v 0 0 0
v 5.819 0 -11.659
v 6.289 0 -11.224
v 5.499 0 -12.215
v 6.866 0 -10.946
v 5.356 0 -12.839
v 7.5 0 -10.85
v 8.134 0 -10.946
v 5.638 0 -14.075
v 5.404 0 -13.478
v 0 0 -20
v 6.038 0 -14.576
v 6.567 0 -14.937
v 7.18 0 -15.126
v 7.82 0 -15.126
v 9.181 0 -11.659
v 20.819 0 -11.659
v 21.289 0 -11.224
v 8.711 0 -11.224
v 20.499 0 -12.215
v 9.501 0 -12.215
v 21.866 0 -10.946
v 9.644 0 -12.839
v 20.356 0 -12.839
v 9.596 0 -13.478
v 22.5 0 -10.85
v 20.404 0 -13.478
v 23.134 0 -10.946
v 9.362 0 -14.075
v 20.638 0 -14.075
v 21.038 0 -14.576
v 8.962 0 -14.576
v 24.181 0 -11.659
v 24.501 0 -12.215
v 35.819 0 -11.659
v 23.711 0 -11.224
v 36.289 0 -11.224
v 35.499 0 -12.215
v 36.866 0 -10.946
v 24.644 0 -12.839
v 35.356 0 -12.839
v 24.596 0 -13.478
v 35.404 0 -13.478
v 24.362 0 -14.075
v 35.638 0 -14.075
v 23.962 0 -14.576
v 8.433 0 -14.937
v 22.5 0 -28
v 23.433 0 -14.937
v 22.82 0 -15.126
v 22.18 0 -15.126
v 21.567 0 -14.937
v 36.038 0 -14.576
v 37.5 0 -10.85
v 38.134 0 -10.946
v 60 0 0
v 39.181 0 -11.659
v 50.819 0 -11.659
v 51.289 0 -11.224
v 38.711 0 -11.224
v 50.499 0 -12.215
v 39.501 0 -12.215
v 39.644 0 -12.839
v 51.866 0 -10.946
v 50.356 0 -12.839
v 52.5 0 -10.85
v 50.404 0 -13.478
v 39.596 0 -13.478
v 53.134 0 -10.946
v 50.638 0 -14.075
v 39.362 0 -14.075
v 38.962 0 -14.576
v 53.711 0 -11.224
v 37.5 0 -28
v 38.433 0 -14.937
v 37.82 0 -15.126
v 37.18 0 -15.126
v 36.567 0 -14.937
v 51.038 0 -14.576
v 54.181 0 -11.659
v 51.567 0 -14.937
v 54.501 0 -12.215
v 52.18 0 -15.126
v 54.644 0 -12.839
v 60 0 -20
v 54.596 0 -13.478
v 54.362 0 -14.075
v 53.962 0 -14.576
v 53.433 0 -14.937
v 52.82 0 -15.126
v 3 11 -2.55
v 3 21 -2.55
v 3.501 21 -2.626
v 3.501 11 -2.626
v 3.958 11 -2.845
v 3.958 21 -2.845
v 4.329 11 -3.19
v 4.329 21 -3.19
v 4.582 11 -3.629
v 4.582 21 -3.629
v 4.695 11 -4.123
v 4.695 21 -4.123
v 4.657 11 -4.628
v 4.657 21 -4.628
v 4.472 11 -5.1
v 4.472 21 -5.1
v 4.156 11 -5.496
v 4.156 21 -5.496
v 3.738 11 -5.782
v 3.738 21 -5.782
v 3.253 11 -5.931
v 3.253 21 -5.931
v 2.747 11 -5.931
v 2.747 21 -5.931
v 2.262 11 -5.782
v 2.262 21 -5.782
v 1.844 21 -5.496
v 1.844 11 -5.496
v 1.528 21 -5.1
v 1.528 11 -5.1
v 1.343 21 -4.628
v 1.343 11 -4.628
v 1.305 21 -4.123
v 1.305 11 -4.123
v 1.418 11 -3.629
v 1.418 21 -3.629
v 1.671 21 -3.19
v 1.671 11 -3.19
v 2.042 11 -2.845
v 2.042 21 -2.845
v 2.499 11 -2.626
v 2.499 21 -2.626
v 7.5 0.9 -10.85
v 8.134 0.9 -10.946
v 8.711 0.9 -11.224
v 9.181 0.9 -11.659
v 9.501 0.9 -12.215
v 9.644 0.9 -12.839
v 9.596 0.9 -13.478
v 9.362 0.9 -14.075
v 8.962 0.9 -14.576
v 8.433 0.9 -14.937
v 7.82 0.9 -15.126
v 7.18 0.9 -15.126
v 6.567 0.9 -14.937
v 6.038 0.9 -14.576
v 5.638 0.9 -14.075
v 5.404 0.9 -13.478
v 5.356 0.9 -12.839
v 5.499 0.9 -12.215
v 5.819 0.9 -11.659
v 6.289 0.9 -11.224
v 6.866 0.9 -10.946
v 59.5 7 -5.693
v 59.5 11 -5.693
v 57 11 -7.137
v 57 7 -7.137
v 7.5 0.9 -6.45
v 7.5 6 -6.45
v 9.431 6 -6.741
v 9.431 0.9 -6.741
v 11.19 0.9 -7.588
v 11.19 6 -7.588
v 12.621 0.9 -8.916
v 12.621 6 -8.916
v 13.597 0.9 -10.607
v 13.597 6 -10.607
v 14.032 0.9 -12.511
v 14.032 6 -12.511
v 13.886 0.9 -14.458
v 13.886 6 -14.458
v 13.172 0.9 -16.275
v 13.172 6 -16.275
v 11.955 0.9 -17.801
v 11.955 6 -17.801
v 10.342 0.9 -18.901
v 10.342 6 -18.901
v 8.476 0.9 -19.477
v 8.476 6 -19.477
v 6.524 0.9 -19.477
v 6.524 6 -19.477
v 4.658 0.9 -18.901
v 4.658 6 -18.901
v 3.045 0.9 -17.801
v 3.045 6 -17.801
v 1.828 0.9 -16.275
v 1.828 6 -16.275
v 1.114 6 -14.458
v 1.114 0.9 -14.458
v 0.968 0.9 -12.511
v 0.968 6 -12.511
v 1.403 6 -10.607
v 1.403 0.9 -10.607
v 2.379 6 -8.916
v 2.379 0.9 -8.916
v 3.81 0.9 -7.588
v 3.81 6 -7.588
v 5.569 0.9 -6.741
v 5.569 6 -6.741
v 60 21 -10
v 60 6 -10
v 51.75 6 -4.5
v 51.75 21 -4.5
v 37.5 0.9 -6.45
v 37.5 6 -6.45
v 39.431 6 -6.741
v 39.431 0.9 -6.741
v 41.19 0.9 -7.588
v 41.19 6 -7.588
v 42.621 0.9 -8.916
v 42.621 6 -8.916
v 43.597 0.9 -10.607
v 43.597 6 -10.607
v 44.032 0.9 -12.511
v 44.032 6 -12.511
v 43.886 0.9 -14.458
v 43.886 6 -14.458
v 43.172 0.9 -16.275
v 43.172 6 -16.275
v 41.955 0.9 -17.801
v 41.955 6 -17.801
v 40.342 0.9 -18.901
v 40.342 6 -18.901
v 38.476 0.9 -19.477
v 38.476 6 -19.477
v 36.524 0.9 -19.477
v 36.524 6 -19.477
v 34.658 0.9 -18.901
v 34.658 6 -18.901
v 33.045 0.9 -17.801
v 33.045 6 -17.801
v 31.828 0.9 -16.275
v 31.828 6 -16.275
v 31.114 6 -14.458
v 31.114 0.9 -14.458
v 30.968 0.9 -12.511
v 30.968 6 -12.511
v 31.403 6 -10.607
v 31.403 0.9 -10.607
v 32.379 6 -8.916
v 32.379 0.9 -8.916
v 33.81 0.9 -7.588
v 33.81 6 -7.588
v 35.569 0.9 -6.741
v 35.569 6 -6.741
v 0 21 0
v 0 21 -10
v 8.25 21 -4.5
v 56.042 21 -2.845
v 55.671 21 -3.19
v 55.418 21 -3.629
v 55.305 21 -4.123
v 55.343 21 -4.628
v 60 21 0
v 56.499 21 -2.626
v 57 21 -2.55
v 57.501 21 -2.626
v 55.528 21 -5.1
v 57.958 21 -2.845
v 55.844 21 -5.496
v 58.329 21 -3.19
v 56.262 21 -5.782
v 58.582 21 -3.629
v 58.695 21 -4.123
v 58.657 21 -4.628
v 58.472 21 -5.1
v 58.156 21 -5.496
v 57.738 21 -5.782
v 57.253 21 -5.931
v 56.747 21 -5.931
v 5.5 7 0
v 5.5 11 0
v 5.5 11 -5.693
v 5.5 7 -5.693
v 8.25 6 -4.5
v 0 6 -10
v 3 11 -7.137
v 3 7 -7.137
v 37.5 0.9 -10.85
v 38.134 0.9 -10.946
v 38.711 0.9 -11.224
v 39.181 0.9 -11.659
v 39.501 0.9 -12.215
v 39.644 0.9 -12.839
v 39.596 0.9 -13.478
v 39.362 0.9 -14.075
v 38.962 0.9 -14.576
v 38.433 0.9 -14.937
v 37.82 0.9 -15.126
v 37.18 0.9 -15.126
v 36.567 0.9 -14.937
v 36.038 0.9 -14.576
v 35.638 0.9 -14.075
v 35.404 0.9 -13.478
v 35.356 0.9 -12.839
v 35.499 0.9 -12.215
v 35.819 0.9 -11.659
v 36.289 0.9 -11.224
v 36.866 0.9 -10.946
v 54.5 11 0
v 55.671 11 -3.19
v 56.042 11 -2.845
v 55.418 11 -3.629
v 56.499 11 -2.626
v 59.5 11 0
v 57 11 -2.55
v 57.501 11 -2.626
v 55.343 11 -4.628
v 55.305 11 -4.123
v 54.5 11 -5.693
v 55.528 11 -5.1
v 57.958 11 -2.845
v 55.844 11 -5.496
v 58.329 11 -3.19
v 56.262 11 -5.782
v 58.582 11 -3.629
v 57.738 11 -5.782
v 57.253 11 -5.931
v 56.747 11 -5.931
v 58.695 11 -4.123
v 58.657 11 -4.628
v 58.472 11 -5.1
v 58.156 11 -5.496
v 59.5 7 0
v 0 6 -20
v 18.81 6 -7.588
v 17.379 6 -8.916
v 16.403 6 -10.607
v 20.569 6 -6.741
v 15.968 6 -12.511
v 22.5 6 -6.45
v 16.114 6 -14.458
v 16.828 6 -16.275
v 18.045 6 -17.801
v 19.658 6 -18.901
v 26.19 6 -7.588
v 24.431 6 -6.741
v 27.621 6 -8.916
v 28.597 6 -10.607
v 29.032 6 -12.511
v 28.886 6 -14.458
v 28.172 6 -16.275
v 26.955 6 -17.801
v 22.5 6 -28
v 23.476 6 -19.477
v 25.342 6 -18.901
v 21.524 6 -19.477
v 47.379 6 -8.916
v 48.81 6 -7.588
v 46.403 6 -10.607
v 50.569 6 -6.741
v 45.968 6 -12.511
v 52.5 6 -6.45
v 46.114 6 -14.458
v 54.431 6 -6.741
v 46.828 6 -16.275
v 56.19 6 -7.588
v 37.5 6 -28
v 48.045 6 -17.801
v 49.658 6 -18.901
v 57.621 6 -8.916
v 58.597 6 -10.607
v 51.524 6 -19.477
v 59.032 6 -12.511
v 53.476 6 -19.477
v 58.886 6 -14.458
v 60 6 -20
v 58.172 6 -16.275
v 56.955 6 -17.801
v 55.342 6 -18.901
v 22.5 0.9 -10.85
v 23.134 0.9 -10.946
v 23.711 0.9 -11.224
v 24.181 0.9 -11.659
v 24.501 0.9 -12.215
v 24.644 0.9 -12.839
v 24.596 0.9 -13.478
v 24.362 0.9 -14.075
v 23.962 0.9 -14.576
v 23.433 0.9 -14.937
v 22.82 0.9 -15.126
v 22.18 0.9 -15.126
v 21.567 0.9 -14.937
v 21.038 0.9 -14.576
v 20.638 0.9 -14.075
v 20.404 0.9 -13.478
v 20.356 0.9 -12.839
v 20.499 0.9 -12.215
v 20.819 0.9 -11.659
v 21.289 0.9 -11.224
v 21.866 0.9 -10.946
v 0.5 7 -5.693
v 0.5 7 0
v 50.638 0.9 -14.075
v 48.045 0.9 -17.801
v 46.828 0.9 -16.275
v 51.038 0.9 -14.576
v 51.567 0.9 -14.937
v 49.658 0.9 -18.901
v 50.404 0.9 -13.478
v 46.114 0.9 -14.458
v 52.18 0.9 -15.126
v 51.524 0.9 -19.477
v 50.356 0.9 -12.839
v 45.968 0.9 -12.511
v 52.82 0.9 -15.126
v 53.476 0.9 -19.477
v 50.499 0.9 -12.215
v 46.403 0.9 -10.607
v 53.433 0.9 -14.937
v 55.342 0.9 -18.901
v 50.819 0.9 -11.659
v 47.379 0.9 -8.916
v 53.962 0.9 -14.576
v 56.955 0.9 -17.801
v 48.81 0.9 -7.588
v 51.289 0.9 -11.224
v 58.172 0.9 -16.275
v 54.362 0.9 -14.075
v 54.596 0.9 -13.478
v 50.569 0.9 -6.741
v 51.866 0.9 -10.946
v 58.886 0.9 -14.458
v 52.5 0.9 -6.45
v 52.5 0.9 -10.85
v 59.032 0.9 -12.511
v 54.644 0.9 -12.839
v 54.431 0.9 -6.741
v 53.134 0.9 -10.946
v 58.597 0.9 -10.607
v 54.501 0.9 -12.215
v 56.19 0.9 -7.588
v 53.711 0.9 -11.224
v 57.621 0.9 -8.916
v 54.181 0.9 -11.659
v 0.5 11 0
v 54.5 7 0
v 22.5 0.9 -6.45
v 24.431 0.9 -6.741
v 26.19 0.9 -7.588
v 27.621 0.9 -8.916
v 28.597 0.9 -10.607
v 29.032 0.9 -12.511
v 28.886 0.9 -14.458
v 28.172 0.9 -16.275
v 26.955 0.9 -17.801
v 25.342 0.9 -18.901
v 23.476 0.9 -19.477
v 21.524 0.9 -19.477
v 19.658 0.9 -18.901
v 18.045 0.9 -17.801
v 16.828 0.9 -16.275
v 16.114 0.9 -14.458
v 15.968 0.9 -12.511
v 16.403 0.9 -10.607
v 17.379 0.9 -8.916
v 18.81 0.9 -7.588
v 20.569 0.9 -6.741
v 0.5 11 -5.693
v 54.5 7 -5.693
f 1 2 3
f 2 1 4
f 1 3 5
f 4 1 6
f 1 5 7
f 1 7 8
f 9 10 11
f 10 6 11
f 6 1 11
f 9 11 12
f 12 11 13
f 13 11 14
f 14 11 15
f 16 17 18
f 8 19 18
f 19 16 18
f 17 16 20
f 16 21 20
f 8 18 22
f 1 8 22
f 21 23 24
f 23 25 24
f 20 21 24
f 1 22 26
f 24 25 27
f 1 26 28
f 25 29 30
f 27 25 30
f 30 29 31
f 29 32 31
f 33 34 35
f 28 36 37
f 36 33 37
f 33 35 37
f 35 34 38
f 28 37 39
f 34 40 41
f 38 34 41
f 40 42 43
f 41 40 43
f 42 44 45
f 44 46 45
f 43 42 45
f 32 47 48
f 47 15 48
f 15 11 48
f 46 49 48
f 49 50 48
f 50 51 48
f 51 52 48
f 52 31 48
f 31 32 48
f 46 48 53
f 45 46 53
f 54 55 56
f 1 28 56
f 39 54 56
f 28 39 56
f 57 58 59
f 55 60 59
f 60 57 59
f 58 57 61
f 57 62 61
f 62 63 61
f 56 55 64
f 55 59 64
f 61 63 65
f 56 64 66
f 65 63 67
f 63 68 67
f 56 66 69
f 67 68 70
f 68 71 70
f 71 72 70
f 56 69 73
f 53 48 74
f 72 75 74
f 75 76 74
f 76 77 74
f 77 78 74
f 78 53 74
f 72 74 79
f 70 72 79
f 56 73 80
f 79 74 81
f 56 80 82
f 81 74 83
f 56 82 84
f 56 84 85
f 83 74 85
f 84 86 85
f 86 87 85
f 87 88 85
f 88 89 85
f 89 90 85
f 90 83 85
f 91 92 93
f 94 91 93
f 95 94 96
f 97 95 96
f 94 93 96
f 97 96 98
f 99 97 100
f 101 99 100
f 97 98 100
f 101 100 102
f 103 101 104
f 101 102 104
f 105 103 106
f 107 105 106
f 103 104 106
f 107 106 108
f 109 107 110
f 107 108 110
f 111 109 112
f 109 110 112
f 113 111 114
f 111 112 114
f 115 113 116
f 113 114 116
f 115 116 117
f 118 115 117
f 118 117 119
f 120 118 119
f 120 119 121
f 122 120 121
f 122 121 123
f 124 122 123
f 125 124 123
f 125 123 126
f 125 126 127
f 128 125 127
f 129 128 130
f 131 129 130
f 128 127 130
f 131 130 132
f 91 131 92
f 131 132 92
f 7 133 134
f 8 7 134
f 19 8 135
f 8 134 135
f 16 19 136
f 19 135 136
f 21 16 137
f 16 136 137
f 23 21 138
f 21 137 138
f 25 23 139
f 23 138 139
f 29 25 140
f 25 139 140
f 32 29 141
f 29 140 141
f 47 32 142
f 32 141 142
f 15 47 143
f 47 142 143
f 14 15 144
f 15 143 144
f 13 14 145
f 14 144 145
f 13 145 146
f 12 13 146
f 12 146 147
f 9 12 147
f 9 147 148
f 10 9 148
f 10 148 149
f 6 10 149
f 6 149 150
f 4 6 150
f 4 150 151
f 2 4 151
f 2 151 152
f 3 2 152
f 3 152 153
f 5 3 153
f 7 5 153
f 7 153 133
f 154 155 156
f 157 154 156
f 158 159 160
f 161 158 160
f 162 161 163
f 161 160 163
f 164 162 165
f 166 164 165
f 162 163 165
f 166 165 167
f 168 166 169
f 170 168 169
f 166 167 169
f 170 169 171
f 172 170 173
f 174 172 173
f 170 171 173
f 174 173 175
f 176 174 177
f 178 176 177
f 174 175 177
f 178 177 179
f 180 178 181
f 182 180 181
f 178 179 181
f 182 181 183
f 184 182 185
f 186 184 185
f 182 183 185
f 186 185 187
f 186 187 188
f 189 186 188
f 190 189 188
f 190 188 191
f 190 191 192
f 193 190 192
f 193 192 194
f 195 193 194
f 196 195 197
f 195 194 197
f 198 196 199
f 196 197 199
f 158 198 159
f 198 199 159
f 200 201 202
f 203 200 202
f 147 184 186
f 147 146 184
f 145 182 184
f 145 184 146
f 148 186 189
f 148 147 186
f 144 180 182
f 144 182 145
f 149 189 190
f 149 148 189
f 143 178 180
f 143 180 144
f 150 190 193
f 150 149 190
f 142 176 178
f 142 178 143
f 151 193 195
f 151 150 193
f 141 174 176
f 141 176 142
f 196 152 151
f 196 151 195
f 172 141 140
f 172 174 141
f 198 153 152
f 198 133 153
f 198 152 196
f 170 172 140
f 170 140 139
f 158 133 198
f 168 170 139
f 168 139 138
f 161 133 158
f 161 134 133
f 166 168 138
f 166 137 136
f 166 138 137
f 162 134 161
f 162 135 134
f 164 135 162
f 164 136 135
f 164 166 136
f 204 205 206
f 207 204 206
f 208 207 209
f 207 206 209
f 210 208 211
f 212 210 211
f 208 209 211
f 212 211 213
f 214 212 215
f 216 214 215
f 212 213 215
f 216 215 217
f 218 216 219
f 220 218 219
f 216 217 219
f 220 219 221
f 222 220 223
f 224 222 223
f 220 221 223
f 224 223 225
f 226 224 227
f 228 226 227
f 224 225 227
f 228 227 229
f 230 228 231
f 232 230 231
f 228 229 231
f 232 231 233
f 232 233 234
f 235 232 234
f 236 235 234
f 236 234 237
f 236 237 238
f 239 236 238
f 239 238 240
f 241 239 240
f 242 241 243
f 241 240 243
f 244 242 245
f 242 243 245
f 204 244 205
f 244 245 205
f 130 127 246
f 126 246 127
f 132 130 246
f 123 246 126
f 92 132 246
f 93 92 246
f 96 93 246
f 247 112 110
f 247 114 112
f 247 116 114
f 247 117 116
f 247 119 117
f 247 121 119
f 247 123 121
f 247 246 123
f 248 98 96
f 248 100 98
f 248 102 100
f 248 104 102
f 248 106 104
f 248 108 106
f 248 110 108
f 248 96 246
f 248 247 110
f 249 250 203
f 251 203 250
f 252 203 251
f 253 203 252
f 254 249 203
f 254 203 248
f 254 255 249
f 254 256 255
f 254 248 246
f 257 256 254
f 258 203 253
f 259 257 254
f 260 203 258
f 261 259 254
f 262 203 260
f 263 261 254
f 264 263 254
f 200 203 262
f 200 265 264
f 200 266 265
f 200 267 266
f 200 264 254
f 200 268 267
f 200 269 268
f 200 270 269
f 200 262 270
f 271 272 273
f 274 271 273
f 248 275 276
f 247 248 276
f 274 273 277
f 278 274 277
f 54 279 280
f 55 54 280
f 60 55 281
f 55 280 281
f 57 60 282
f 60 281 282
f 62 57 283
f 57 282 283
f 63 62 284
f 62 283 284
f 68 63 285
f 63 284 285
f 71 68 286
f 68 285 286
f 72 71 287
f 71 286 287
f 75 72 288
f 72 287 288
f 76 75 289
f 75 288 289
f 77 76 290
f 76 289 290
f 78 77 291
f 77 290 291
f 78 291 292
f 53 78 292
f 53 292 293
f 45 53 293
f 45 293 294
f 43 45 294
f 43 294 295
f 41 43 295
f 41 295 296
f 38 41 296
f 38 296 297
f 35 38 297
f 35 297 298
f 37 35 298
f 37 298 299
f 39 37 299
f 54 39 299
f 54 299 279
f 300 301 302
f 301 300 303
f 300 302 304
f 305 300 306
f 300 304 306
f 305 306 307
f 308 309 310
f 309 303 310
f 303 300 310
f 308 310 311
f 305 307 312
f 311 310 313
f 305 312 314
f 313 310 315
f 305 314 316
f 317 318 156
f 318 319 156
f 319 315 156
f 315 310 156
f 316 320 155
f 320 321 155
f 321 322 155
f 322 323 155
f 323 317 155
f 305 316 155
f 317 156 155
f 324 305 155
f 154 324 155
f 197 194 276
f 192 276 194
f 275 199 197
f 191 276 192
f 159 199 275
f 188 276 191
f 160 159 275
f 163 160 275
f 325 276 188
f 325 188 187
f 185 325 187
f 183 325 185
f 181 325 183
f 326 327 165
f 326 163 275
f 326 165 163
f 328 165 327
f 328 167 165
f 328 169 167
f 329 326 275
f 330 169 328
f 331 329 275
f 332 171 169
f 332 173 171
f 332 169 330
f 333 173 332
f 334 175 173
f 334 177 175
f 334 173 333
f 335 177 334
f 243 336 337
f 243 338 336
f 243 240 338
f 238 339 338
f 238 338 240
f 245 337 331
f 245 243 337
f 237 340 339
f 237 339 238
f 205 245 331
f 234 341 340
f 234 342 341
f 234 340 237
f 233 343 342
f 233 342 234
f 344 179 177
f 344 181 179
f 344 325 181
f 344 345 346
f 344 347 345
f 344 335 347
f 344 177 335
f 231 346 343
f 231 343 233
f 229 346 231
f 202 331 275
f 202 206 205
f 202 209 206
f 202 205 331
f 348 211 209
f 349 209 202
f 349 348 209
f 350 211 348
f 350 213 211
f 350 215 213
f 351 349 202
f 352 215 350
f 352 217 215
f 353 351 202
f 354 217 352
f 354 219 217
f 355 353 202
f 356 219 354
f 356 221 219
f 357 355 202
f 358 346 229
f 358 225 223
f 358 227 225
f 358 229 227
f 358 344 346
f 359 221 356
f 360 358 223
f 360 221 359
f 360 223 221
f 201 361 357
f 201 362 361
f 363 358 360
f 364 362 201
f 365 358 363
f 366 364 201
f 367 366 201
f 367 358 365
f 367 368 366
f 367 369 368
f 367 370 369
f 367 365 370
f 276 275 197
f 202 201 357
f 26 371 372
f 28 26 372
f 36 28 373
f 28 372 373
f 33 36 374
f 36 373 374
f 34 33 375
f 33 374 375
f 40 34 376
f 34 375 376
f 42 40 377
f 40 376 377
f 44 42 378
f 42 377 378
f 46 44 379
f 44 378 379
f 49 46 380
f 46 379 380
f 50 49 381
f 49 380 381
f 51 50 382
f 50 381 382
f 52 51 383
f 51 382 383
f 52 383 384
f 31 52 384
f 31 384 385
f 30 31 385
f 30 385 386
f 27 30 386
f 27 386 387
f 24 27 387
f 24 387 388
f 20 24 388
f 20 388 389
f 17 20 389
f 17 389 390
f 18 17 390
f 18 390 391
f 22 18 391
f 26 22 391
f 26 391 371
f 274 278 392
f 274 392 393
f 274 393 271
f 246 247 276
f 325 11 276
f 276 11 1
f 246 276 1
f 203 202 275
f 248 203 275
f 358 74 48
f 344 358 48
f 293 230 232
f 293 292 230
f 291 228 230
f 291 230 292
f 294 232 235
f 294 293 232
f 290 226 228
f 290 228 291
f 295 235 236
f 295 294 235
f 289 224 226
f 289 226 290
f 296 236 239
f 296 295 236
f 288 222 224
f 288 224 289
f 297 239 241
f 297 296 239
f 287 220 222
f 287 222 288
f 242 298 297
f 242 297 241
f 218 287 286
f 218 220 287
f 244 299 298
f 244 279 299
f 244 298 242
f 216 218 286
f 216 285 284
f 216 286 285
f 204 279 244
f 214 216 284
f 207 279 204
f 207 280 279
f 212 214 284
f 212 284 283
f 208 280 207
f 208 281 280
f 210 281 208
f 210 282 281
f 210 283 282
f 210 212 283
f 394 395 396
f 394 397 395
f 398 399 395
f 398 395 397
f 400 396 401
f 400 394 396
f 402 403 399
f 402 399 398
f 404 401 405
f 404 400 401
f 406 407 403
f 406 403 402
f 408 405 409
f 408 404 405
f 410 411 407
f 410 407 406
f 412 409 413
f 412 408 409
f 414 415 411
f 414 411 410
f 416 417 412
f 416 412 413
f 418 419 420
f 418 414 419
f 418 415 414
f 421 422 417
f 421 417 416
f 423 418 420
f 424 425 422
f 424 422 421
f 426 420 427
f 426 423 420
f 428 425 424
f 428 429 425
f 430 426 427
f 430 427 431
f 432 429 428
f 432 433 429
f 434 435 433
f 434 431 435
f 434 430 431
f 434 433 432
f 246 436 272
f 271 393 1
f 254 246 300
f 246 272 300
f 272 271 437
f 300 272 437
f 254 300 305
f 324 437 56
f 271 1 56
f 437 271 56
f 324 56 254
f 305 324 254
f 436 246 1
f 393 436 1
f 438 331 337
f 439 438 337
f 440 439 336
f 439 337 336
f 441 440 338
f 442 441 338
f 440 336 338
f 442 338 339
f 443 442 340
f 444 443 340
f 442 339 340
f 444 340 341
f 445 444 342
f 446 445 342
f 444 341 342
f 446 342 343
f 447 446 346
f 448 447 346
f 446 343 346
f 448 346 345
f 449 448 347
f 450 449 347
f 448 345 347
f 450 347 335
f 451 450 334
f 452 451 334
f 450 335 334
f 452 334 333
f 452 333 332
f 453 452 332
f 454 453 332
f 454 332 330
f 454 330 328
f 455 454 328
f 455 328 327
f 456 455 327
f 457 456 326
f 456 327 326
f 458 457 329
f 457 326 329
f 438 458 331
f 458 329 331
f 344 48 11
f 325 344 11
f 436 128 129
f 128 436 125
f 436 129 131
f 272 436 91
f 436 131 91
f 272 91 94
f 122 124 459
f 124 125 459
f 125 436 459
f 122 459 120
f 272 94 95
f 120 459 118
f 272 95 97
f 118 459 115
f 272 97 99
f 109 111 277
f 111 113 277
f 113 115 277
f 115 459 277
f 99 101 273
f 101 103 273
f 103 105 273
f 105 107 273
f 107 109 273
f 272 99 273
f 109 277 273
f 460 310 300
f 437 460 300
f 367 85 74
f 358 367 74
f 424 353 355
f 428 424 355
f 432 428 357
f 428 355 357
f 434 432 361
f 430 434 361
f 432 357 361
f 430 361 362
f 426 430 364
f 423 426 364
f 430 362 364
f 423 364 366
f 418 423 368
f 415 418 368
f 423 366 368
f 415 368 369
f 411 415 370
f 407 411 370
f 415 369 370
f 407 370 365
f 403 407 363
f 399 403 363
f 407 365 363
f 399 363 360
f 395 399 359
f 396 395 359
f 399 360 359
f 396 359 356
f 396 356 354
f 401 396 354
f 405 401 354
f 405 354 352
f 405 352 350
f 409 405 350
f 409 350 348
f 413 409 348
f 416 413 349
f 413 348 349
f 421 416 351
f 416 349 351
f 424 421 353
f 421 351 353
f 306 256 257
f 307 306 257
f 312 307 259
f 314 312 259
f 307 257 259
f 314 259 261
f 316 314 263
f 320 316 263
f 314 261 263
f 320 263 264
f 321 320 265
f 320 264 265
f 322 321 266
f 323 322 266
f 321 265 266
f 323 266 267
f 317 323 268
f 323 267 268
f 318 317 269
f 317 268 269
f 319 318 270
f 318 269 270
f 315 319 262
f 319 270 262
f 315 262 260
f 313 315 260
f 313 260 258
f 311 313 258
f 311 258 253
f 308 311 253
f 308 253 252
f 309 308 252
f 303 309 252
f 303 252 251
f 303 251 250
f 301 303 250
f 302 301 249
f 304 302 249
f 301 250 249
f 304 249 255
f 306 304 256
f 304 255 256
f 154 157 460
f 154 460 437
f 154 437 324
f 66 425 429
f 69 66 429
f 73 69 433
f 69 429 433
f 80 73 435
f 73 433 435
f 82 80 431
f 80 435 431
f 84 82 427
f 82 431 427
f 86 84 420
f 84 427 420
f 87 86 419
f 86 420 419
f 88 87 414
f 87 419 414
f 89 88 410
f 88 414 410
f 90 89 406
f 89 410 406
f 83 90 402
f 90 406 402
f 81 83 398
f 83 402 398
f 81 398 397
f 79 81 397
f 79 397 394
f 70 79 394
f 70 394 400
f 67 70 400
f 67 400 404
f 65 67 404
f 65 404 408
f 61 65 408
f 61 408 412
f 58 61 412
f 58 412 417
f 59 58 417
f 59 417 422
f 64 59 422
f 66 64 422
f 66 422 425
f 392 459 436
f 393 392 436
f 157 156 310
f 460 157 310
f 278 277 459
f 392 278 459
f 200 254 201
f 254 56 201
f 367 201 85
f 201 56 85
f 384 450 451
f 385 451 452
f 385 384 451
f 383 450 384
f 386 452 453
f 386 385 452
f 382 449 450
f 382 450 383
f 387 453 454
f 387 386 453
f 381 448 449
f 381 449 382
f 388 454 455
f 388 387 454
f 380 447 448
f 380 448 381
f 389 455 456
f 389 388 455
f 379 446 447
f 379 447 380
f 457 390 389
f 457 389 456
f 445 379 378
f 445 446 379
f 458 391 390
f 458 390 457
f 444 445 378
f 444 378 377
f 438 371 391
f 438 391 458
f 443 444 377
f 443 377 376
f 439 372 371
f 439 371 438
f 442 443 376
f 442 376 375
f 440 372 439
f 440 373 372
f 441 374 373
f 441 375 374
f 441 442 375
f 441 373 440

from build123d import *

# Parameters (mm, degrees)
BOSS_EXTRUDE1_DEPTH = 6
BOSS_EXTRUDE3_DEPTH = 15
SKETCH4_R           = 1.7
CUT_EXTRUDE1_DEPTH  = 10
CUT_EXTRUDE2_START  = -10
CUT_EXTRUDE2_DEPTH  = 4
SKETCH2_4_R         = 6.55
CUT_EXTRUDE3_DEPTH  = 5.1
SKETCH2_5_R         = 2.15
CUT_EXTRUDE4_DEPTH  = 68.88961629


with BuildPart() as part:
    # Sketch1 → Boss-Extrude1 (new body)
    with BuildSketch(Plane(origin=(0, 0, 0), x_dir=(1, 0, 0), z_dir=(0, 1, 0))):
        Polygon((0, 0), (60, 0), (60, 20), (37.5, 28), (22.5, 28), (0, 20), align=None)
    extrude(amount=BOSS_EXTRUDE1_DEPTH)

    # Sketch3 → Boss-Extrude3 (add)
    with BuildSketch(Plane(origin=(0, 6, 0), x_dir=(1, 0, 0), z_dir=(0, 1, 0))):
        Polygon((0, 10), (0, 0), (60, 0), (60, 10), (51.75, 4.5), (8.25, 4.5), align=None)
    extrude(amount=BOSS_EXTRUDE3_DEPTH)

    # Sketch4 → Cut-Extrude1 (cut)
    with BuildSketch(Plane(origin=(0, 21, 0), x_dir=(1, 0, 0), z_dir=(0, 1, 0))):
        with Locations((3, 4.25)):
            Circle(SKETCH4_R)
        with Locations((57, 4.25)):
            Circle(SKETCH4_R)
    extrude(amount=-CUT_EXTRUDE1_DEPTH, mode=Mode.SUBTRACT)

    # Sketch6 → Cut-Extrude2 (cut)
    with BuildSketch(Plane(origin=(0, 21, 0), x_dir=(1, 0, 0), z_dir=(0, 1, 0)).offset(CUT_EXTRUDE2_START)):
        Polygon((54.5, 0), (59.5, 0), (59.5, 5.693375673), (57, 7.136751346), (54.5, 5.693375673), align=None)
        Polygon((5.5, 0), (5.5, 5.693375673), (3, 7.136751346), (0.5, 5.693375673), (0.5, 0), align=None)
    extrude(amount=-CUT_EXTRUDE2_DEPTH, mode=Mode.SUBTRACT)

    # Sketch2<4> → Cut-Extrude3 (cut)
    with BuildSketch(Plane(origin=(0, 6, 0), x_dir=(1, 0, 0), z_dir=(0, 1, 0))):
        with Locations((22.5, 13)):
            Circle(SKETCH2_4_R)
        with Locations((37.5, 13)):
            Circle(SKETCH2_4_R)
        with Locations((7.5, 13)):
            Circle(SKETCH2_4_R)
        with Locations((52.5, 13)):
            Circle(SKETCH2_4_R)
    extrude(amount=-CUT_EXTRUDE3_DEPTH, mode=Mode.SUBTRACT)

    # Sketch2<5> → Cut-Extrude4 (cut, through all)
    with BuildSketch(Plane(origin=(0, 6, 0), x_dir=(1, 0, 0), z_dir=(0, 1, 0))):
        with Locations((37.5, 13)):
            Circle(SKETCH2_5_R)
        with Locations((22.5, 13)):
            Circle(SKETCH2_5_R)
        with Locations((7.5, 13)):
            Circle(SKETCH2_5_R)
        with Locations((52.5, 13)):
            Circle(SKETCH2_5_R)
    extrude(amount=-CUT_EXTRUDE4_DEPTH, mode=Mode.SUBTRACT)


solid = part.part
